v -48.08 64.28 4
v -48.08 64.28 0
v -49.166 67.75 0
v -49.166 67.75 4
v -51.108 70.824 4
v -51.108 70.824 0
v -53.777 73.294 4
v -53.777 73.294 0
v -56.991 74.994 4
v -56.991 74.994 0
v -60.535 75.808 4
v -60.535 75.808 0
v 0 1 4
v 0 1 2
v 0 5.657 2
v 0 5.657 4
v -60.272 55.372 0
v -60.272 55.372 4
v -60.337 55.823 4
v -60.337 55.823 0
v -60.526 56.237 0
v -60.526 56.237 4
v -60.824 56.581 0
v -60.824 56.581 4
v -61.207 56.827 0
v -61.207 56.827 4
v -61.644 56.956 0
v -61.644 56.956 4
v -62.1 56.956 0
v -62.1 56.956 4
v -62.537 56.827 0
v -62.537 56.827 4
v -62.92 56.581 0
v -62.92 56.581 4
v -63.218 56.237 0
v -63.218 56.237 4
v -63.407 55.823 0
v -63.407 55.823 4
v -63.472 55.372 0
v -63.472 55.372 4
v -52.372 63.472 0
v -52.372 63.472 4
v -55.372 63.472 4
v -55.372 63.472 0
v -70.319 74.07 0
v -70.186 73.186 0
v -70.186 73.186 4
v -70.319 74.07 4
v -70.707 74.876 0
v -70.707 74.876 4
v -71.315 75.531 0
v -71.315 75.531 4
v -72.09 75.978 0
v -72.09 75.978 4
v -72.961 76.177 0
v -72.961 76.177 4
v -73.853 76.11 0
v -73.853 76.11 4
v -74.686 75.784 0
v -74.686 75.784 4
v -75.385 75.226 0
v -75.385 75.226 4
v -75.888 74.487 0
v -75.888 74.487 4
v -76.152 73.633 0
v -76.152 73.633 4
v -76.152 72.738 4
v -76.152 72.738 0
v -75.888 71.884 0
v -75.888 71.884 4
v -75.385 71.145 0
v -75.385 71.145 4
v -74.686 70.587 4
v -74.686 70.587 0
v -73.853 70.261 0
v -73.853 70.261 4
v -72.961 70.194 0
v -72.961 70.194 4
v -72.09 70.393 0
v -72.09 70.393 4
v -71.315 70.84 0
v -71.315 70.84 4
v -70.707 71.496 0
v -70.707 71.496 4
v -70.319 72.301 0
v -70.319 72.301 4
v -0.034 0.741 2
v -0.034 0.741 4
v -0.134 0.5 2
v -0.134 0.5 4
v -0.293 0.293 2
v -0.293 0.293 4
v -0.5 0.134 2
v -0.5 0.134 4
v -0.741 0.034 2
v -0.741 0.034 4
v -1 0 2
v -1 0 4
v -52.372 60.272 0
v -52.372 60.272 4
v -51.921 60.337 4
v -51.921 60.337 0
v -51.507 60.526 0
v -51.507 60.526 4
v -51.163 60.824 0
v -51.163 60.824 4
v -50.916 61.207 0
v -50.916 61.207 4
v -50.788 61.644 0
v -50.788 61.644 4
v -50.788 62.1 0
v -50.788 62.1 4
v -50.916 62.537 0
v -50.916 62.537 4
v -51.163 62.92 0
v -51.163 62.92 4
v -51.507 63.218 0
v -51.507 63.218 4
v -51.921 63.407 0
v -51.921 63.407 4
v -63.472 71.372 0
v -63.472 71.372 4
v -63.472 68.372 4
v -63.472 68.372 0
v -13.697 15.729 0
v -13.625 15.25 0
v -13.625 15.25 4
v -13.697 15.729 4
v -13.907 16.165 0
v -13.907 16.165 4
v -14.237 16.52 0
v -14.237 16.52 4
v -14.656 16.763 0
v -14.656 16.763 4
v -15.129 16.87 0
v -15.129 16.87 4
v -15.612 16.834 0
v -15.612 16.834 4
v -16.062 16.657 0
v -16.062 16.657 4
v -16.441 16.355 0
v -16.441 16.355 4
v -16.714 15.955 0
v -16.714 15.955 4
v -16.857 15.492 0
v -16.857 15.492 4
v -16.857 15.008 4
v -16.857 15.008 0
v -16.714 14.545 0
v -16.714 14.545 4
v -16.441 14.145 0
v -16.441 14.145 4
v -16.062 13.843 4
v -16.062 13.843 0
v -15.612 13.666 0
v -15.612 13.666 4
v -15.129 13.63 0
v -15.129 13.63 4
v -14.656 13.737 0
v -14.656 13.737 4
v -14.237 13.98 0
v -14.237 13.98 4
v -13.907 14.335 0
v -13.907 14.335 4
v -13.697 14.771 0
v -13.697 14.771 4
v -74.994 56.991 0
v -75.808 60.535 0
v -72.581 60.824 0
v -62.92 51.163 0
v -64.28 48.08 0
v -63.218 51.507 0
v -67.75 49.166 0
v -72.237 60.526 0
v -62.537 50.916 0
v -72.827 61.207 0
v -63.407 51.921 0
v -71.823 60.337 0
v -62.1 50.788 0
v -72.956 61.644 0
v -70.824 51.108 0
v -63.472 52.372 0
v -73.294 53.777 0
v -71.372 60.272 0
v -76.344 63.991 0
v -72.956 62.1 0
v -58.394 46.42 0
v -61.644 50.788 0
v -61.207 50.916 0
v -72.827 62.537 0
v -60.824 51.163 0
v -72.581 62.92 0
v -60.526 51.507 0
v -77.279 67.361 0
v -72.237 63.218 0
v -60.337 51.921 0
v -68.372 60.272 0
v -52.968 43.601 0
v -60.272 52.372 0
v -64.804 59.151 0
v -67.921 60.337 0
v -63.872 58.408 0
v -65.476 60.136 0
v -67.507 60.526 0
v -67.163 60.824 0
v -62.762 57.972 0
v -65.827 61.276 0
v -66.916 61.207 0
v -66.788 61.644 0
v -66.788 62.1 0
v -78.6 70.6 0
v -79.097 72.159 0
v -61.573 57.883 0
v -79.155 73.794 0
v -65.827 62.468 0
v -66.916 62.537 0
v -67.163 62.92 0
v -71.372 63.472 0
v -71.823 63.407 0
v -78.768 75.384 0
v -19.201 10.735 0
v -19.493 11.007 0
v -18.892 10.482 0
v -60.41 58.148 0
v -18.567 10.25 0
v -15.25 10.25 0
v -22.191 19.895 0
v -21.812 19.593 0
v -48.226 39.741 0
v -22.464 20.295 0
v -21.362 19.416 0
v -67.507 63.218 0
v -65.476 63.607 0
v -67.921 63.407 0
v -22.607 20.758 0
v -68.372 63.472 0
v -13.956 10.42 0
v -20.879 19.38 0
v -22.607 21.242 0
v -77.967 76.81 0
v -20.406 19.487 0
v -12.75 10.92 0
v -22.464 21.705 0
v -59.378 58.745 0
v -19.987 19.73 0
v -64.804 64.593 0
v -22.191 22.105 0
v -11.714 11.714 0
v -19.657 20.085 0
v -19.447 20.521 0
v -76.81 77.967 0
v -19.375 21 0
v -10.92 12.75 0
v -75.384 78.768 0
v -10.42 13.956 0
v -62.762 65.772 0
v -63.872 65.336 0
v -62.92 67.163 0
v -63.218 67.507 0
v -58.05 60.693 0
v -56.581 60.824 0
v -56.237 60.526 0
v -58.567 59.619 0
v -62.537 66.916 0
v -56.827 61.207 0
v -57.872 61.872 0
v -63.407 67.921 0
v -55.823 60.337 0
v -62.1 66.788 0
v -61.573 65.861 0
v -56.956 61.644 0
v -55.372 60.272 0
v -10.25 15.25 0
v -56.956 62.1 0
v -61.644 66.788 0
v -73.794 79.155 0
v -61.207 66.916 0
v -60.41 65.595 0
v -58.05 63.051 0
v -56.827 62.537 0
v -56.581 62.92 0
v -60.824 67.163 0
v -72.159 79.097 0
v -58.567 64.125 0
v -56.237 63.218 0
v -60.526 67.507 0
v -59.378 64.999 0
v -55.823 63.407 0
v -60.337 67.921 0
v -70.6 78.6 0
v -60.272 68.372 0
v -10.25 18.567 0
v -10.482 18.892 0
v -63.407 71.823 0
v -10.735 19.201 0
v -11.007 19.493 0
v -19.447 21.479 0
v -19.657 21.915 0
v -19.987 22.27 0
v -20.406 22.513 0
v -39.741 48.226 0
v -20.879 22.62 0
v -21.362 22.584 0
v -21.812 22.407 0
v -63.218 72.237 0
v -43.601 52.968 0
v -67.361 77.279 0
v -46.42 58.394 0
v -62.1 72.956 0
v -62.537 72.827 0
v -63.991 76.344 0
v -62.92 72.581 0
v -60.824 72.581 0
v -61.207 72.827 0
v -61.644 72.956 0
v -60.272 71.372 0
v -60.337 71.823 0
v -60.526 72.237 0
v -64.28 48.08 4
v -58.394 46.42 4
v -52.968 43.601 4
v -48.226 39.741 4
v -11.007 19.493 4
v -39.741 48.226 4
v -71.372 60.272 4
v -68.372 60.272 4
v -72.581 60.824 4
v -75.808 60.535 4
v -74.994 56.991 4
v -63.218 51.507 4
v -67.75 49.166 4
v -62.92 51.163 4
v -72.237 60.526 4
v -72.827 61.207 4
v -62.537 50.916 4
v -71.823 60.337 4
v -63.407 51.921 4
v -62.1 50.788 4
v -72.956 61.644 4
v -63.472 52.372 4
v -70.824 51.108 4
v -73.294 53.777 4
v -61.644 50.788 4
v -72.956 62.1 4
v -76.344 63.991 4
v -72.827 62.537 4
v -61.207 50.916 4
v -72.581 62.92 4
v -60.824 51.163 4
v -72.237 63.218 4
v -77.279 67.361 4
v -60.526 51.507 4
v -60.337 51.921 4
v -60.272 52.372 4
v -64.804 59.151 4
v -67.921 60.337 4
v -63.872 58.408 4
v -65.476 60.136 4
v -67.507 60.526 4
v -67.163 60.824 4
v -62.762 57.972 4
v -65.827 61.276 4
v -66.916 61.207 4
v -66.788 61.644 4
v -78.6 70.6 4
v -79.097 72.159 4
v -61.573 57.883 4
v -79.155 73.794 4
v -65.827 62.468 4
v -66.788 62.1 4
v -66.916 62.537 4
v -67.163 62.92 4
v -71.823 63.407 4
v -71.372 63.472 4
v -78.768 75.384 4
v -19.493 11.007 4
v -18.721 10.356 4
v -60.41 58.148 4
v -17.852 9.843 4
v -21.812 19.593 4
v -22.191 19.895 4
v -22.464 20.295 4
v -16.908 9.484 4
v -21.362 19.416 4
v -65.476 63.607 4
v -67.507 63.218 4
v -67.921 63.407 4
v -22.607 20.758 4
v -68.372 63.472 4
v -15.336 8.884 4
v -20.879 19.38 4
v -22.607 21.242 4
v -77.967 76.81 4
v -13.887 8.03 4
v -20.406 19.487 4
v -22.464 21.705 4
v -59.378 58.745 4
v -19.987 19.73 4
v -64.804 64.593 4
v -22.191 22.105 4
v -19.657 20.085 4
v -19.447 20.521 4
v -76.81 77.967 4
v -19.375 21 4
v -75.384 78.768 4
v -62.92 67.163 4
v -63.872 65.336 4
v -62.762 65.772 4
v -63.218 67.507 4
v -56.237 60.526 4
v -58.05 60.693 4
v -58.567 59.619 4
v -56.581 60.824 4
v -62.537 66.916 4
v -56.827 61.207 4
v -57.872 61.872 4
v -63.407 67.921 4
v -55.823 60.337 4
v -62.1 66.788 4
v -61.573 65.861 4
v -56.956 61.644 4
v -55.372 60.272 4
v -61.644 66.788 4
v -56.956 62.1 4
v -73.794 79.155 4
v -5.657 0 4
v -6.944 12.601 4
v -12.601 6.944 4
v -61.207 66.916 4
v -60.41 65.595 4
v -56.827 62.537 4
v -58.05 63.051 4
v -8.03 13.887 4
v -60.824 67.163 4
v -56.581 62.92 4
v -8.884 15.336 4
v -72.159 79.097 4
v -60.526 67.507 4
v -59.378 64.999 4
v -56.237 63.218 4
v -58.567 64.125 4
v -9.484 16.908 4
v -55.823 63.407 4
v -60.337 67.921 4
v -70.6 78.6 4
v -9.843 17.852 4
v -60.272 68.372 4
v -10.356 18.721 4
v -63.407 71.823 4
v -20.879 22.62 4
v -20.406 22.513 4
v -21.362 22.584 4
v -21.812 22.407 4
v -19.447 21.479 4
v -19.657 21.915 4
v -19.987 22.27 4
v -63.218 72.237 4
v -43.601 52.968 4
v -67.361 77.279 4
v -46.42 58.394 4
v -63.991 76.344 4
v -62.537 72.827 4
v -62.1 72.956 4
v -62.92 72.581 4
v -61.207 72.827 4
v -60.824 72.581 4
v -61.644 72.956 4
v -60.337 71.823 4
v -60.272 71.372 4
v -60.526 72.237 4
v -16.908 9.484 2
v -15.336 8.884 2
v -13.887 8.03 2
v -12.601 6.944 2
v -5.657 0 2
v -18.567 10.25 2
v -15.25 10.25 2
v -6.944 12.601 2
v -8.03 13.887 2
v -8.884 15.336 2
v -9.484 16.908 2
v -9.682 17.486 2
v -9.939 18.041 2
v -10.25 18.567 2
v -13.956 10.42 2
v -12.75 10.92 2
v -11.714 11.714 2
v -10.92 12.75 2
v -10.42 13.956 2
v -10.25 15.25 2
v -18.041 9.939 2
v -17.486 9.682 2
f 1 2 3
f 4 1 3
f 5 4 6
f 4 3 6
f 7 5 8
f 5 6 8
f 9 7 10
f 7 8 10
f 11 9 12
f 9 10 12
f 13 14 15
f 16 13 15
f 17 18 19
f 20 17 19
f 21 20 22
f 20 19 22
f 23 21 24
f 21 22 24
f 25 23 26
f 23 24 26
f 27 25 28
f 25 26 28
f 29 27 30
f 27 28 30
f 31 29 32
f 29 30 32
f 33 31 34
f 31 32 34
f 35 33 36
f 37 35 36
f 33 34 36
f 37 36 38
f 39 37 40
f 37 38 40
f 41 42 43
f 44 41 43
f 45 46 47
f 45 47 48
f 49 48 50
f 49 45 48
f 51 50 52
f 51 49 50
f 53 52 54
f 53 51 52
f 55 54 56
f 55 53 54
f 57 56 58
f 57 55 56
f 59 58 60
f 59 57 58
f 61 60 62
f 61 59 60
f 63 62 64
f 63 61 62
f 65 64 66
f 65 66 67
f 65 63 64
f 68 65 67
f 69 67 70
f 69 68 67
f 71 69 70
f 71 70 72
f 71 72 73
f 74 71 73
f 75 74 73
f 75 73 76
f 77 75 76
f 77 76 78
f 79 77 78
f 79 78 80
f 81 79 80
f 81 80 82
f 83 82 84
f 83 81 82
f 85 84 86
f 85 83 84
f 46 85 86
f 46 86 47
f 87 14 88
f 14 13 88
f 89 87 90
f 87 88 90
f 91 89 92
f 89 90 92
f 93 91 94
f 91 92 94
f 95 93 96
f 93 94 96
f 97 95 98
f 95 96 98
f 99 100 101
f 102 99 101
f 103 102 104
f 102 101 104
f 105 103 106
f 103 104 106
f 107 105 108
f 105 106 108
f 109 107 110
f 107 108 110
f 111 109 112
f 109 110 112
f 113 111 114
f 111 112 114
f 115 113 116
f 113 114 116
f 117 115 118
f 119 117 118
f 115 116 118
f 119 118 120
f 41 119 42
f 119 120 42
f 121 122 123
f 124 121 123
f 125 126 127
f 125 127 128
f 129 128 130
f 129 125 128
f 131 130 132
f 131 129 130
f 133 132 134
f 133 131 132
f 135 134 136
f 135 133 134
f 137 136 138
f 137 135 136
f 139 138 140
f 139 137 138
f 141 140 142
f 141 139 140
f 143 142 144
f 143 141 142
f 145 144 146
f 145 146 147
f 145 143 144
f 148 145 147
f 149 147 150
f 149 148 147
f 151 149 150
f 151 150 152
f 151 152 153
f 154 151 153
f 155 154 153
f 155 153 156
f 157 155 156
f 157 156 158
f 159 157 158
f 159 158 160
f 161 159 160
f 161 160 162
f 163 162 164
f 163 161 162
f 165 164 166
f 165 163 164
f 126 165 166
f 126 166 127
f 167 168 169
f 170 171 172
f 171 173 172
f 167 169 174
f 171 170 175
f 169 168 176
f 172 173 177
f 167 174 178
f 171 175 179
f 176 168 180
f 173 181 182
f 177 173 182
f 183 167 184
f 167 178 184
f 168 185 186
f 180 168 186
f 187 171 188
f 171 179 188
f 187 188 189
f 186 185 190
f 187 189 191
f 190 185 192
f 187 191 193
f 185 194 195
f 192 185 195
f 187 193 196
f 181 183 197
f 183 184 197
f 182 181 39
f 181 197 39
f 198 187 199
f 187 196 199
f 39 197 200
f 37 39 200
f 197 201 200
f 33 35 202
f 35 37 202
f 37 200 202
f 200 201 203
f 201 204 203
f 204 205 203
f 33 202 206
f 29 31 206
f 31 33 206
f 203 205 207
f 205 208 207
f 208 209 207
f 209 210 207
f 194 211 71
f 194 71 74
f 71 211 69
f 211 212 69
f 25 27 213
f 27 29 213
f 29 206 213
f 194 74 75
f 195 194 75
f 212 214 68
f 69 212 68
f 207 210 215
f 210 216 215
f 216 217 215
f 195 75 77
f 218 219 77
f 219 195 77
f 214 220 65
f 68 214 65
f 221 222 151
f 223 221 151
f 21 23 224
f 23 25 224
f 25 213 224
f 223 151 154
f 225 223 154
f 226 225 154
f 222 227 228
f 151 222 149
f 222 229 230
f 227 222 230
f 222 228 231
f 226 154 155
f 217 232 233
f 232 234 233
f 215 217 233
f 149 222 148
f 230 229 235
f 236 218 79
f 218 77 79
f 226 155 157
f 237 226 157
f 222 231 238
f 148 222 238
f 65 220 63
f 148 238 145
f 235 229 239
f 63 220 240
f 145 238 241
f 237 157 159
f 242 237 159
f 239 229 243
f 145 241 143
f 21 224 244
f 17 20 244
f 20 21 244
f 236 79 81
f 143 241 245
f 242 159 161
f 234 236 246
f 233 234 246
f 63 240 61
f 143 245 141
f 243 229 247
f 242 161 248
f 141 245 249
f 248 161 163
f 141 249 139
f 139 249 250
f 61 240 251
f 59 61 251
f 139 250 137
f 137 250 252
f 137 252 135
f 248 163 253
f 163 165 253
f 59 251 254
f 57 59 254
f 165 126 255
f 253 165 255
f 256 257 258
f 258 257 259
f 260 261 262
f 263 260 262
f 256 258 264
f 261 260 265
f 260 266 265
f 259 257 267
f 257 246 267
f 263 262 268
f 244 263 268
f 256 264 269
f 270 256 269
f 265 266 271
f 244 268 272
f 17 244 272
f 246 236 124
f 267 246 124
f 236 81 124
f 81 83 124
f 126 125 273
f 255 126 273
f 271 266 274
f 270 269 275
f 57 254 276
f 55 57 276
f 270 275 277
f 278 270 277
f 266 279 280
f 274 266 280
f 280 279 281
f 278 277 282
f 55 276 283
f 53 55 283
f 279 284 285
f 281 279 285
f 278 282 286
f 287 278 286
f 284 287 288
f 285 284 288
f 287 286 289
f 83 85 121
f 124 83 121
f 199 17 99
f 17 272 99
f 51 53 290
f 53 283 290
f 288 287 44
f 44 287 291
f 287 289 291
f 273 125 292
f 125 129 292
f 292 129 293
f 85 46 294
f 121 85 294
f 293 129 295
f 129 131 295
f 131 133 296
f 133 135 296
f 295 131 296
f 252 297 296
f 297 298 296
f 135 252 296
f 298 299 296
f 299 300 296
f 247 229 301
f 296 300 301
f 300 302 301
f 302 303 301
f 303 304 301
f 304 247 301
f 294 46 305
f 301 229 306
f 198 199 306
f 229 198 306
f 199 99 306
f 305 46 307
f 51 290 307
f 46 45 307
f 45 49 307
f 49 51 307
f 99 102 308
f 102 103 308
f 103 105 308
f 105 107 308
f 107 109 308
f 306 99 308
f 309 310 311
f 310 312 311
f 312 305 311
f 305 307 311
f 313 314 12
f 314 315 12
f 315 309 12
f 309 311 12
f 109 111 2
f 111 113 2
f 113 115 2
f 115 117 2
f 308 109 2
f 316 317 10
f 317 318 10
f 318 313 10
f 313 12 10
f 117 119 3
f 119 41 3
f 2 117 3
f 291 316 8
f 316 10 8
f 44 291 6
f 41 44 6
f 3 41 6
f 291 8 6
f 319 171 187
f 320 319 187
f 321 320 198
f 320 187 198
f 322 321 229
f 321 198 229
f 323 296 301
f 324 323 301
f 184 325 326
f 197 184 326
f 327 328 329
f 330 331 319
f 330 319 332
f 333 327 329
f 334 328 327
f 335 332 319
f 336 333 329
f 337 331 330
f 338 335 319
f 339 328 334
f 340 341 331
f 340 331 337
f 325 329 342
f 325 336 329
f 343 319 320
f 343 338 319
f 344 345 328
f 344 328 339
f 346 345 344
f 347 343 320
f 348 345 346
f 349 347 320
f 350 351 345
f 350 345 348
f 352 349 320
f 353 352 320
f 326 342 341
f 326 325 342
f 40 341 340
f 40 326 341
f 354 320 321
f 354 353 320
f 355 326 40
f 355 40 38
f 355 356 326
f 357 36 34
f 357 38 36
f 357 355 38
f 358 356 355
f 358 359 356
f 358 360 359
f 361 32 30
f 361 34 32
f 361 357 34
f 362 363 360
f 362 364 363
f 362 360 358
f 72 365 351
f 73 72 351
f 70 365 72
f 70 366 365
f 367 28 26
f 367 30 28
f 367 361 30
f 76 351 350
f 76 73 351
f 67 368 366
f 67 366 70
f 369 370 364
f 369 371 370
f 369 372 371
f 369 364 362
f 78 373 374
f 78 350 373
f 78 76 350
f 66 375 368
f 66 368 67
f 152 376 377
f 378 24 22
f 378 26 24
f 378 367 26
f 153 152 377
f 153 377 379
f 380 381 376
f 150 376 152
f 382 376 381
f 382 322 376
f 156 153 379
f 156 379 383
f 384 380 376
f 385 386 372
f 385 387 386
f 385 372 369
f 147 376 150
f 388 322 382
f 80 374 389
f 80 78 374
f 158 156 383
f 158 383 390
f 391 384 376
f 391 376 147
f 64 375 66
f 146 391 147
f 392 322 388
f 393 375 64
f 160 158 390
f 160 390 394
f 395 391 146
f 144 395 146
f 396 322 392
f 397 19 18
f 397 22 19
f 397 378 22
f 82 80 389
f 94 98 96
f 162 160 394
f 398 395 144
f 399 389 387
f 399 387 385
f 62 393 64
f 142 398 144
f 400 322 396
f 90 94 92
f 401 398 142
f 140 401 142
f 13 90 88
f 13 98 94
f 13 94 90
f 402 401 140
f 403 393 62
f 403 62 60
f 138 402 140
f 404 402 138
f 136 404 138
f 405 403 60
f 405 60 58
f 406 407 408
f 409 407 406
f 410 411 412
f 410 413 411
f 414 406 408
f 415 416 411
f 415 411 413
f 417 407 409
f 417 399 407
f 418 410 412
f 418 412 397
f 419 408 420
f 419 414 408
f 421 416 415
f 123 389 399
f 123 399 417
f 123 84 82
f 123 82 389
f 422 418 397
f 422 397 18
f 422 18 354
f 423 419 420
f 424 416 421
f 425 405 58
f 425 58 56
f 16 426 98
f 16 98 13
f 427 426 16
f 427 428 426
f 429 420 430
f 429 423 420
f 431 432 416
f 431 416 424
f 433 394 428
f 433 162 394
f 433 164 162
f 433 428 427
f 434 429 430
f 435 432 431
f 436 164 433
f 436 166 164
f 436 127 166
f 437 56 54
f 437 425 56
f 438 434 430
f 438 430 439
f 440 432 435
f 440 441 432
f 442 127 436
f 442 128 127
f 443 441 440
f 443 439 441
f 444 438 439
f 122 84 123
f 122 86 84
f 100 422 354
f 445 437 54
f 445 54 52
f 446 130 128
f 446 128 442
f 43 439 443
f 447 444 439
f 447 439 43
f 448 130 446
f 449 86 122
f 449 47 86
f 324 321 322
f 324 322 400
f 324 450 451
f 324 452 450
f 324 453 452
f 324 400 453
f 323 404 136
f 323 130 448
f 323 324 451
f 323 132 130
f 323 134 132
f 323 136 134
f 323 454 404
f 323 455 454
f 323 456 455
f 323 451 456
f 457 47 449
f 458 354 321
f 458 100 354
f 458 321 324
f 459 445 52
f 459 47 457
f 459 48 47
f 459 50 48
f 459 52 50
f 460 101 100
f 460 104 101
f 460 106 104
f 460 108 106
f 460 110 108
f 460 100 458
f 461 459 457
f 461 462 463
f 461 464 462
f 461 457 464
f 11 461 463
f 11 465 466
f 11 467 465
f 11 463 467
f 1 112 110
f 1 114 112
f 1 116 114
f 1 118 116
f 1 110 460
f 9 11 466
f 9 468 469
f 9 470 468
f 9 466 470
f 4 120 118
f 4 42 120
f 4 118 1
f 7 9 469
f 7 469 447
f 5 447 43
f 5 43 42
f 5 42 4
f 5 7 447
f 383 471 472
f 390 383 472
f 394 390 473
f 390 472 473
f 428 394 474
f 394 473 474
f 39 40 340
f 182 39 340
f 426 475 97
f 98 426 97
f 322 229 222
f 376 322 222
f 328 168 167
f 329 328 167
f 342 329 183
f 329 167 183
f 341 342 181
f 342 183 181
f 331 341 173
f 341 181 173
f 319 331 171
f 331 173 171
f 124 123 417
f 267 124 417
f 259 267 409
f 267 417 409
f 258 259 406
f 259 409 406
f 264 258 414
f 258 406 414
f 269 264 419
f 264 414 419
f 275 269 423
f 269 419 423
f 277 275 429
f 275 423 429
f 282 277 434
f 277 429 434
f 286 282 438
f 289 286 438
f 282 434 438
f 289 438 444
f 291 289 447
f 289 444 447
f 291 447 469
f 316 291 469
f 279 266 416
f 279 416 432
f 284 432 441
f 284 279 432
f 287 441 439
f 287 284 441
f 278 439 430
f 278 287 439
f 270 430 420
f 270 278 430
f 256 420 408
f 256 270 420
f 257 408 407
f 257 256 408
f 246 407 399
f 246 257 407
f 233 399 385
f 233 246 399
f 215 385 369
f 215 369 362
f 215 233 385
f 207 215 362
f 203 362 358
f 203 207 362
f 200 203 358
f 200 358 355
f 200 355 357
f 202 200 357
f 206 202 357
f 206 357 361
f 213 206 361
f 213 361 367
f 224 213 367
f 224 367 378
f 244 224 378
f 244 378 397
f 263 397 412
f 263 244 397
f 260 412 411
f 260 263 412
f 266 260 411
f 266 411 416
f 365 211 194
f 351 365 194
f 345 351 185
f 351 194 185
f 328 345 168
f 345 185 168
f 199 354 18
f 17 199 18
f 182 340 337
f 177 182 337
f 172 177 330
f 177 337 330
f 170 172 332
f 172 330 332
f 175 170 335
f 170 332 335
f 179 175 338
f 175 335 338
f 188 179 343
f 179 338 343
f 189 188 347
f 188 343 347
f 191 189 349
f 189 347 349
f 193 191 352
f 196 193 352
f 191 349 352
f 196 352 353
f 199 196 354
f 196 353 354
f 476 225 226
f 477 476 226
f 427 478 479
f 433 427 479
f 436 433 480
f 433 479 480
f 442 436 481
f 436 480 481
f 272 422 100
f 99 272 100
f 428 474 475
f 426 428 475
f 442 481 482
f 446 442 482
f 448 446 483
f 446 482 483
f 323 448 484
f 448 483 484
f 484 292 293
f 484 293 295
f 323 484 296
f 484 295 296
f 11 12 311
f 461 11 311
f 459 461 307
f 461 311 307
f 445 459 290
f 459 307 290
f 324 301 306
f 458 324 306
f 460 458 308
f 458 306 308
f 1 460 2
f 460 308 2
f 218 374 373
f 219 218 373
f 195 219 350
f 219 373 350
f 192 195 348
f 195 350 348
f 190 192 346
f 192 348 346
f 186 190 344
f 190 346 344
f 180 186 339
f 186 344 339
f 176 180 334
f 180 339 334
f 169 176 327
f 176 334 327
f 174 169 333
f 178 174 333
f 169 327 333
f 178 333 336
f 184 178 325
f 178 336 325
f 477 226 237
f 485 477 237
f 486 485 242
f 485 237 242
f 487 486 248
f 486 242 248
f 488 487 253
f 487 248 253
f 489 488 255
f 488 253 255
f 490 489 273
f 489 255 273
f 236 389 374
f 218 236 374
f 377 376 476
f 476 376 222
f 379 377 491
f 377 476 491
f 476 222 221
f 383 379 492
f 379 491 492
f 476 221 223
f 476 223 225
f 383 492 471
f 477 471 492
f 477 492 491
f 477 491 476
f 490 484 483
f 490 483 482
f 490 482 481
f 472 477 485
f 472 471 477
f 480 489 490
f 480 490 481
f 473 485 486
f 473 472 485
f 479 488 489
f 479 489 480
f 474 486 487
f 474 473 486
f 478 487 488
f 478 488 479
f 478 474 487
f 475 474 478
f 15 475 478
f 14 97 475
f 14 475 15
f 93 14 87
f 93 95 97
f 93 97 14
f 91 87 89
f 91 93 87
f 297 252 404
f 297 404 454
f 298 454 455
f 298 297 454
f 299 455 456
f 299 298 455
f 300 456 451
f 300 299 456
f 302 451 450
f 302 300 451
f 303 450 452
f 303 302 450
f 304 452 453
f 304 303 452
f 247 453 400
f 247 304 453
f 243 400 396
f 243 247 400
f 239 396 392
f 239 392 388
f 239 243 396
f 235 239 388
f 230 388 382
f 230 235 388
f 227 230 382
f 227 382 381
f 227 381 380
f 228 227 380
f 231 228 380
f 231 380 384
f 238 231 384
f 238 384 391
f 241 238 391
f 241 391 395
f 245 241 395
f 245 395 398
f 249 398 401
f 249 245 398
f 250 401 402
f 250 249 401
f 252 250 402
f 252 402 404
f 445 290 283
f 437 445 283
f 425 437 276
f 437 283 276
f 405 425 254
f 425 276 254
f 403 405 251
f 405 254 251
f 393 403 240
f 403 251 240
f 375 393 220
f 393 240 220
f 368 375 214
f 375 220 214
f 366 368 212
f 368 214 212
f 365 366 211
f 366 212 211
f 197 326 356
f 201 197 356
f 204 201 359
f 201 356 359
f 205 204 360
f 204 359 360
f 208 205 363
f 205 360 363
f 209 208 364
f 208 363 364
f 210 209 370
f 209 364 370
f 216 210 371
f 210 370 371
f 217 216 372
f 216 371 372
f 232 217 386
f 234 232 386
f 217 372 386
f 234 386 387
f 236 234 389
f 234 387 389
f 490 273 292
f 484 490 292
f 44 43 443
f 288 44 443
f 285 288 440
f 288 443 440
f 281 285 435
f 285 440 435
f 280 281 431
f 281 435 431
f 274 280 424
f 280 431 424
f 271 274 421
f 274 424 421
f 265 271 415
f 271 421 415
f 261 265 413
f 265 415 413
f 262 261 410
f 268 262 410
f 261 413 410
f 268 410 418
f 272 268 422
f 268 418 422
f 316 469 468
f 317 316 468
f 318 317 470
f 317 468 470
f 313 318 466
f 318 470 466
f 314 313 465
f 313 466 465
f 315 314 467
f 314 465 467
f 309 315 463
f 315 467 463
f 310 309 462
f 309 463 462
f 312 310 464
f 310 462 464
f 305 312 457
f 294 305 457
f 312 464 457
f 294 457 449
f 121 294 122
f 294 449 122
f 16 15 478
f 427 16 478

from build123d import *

# Parameters (mm, degrees)
F0_R     = 1.625
F0_R_2   = 4
F0_R_3   = 3
F1_DEPTH = 4
F3_DEPTH = 25
F5_DEPTH = 2
F6_R     = 1


with BuildPart() as f1:
    # F0 (on Top) → F1 (new body)
    with BuildSketch(Plane.XY):
        with BuildLine():
            ThreePointArc((-9.4837298081, 16.9083510106), (-10.0814206469, 18.2972590095), (-11.0073593129, 19.4926406871))
            Line((-11.0073593129, 19.4926406871), (-39.7406588467, 48.2259402209))
            ThreePointArc((-39.7406588467, 48.2259402209), (-45.1494727757, 55.6091692733), (-48.0804471902, 64.2796207229))
            ThreePointArc((-48.0804471902, 64.2796207229), (-52.3618521384, 72.1460862496), (-60.5351583135, 75.8078855862))
            ThreePointArc((-60.5351583135, 75.8078855862), (-65.6898975166, 76.7624502228), (-70.5997654152, 78.5997654152))
            ThreePointArc((-70.5997654152, 78.5997654152), (-77.4281925399, 77.4281925399), (-78.5997654152, 70.5997654152))
            ThreePointArc((-78.5997654152, 70.5997654152), (-76.7624502228, 65.6898975166), (-75.8078855862, 60.5351583135))
            ThreePointArc((-75.8078855862, 60.5351583135), (-72.1460862496, 52.3618521384), (-64.2796207229, 48.0804471902))
            ThreePointArc((-64.2796207229, 48.0804471902), (-55.6091692733, 45.1494727757), (-48.2259402209, 39.7406588467))
            Line((-48.2259402209, 39.7406588467), (-19.4926406871, 11.0073593129))
            ThreePointArc((-19.4926406871, 11.0073593129), (-18.2972590095, 10.0814206469), (-16.9083510106, 9.4837298081))
            ThreePointArc((-16.9083510106, 9.4837298081), (-14.5935043457, 8.4875784101), (-12.6012015497, 6.9443473002))
            Line((-12.6012015497, 6.9443473002), (-5.6568542495, 0))
            Line((-5.6568542495, 0), (0, 0))
            Line((0, 0), (0, 5.6568542495))
            Line((0, 5.6568542495), (-6.9443473002, 12.6012015497))
            ThreePointArc((-6.9443473002, 12.6012015497), (-8.4875784101, 14.5935043457), (-9.4837298081, 16.9083510106))
        make_face()
        with Locations((-15.25, 15.25)):
            Circle(F0_R, mode=Mode.SUBTRACT)
        with Locations((-21, 21)):
            Circle(F0_R, mode=Mode.SUBTRACT)
        with Locations((-61.8718433538, 61.8718433538)):
            Circle(F0_R_2, mode=Mode.SUBTRACT)
        with Locations((-73.1855518528, 73.1855518528)):
            Circle(F0_R_3, mode=Mode.SUBTRACT)
    extrude(amount=F1_DEPTH)

    # F2 (on face) → F3 (cut)
    with BuildSketch(Plane.XY.offset(4)):
        with BuildLine():
            ThreePointArc((-55.3718433538, 63.4718433538), (-56.9718433538, 61.8718433538), (-55.3718433538, 60.2718433538))
            Line((-55.3718433538, 60.2718433538), (-52.3718433538, 60.2718433538))
            ThreePointArc((-52.3718433538, 60.2718433538), (-50.7718433538, 61.8718433538), (-52.3718433538, 63.4718433538))
            Line((-52.3718433538, 63.4718433538), (-55.3718433538, 63.4718433538))
        make_face()
        with BuildLine():
            Line((-63.4718433538, 71.3718433538), (-63.4718433538, 68.3718433538))
            ThreePointArc((-63.4718433538, 68.3718433538), (-61.8718433538, 66.7718433538), (-60.2718433538, 68.3718433538))
            Line((-60.2718433538, 68.3718433538), (-60.2718433538, 71.3718433538))
            ThreePointArc((-60.2718433538, 71.3718433538), (-61.8718433538, 72.9718433538), (-63.4718433538, 71.3718433538))
        make_face()
        with BuildLine():
            Line((-71.3718433538, 60.2718433538), (-68.3718433538, 60.2718433538))
            ThreePointArc((-68.3718433538, 60.2718433538), (-66.7718433538, 61.8718433538), (-68.3718433538, 63.4718433538))
            Line((-68.3718433538, 63.4718433538), (-71.3718433538, 63.4718433538))
            ThreePointArc((-71.3718433538, 63.4718433538), (-72.9718433538, 61.8718433538), (-71.3718433538, 60.2718433538))
        make_face()
        with BuildLine():
            Line((-60.2718433538, 52.3718433538), (-60.2718433538, 55.3718433538))
            ThreePointArc((-60.2718433538, 55.3718433538), (-61.8718433538, 56.9718433538), (-63.4718433538, 55.3718433538))
            Line((-63.4718433538, 55.3718433538), (-63.4718433538, 52.3718433538))
            ThreePointArc((-63.4718433538, 52.3718433538), (-61.8718433538, 50.7718433538), (-60.2718433538, 52.3718433538))
        make_face()
    extrude(amount=-F3_DEPTH, mode=Mode.SUBTRACT)

    # F4 (on face) → F5 (cut)
    with BuildSketch(Plane(origin=(0, 0, 0), x_dir=(1, 0, 0), z_dir=(0, 0, -1))):
        with BuildLine():
            Line((0, 0), (-20, 0))
            Line((-20, 0), (-20, -10.25))
            Line((-20, -10.25), (-15.25, -10.25))
            ThreePointArc((-15.25, -10.25), (-11.7144660941, -11.7144660941), (-10.25, -15.25))
            Line((-10.25, -15.25), (-10.25, -20))
            Line((-10.25, -20), (0, -20))
            Line((0, -20), (0, 0))
        make_face()
    extrude(amount=-F5_DEPTH, mode=Mode.SUBTRACT)

    # F6
    f6_edges = [f1.edges().sort_by_distance(p)[0] for p in [
        (0, 0, 3),
    ]]
    fillet(f6_edges, radius=F6_R)


solid = f1.part
